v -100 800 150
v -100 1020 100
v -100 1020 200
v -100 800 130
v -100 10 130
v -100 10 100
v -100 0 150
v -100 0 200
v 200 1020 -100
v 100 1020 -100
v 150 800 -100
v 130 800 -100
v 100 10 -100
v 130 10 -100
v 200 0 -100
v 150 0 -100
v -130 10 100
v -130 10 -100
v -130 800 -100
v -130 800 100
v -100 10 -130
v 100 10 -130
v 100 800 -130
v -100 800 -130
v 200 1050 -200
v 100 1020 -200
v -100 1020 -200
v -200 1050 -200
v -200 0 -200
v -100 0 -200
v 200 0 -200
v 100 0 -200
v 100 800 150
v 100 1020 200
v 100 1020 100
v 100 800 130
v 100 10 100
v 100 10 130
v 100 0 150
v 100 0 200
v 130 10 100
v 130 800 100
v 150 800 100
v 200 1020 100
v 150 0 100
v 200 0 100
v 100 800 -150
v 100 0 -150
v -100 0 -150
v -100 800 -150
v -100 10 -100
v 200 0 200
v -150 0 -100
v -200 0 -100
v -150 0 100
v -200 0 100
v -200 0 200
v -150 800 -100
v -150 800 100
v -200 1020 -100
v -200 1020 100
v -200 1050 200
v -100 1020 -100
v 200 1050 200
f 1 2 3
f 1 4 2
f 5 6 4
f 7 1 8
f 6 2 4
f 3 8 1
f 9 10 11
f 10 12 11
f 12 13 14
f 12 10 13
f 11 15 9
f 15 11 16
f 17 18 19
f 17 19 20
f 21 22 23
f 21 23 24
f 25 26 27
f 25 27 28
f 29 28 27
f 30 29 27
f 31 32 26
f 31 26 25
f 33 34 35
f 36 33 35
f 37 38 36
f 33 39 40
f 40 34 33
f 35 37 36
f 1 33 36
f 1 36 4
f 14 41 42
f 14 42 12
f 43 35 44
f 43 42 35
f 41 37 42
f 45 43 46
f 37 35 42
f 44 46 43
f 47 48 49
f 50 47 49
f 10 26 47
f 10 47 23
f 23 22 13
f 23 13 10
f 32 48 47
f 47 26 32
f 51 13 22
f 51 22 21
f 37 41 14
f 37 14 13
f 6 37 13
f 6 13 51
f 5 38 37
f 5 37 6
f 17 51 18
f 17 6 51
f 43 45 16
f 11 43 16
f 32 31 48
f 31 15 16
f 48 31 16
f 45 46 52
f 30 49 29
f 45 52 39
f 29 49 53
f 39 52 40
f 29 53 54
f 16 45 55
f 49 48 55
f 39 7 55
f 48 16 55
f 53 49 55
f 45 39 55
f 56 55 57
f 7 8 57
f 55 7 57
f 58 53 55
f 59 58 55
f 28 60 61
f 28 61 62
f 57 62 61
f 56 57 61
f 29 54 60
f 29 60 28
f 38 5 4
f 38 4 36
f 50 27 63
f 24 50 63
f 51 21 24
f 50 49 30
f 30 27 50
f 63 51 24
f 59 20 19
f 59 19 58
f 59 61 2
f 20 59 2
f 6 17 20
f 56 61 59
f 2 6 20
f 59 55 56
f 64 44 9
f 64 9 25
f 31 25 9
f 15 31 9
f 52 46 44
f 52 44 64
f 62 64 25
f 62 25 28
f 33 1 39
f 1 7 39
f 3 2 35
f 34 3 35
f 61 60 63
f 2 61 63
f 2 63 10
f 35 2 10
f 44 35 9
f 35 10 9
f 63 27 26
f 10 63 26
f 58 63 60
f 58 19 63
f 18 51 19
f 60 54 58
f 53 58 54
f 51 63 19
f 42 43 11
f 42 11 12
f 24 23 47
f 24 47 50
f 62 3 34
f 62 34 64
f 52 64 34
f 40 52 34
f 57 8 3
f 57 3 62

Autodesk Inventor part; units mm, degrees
ref_plane "YZ Plane" through (0, 0, 0) normal (1, 0, 0) x (0, 1, 0)
ref_plane "XZ Plane" through (0, 0, 0) normal (0, 1, 0) x (-1, 0, 0)
ref_plane "XY Plane" through (0, 0, 0) normal (0, 0, 1) x (1, 0, 0)
sketch "Sketch1" plane through (0, 0, 0) normal (0, 1, 0) x (-1, 0, 0)
  line L0 (150, 150) -> (-150, 150)
  line L1 (-150, 150) -> (-150, -150)
  line L2 (-150, -150) -> (150, -150)
  line L3 (150, -150) -> (150, 150)
  line L4 (150, 150) -> (-150, -150) construction
  line L5 (-150, 150) -> (150, -150) construction
  line L6 (100, -100) -> (200, -100)
  line L7 (200, -100) -> (200, -200)
  line L8 (200, -200) -> (100, -200)
  line L9 (100, -200) -> (100, -100)
  line L10 (100, -100) -> (200, -200) construction
  line L11 (200, -100) -> (100, -200) construction
  line L12 (100, 200) -> (200, 200)
  line L13 (200, 200) -> (200, 100)
  line L14 (200, 100) -> (100, 100)
  line L15 (100, 100) -> (100, 200)
  line L16 (100, 200) -> (200, 100) construction
  line L17 (200, 200) -> (100, 100) construction
  line L18 (-100, 100) -> (-200, 100)
  line L19 (-200, 100) -> (-200, 200)
  line L20 (-200, 200) -> (-100, 200)
  line L21 (-100, 200) -> (-100, 100)
  line L22 (-100, 100) -> (-200, 200) construction
  line L23 (-200, 100) -> (-100, 200) construction
  line L24 (-100, -100) -> (-200, -100)
  line L25 (-200, -100) -> (-200, -200)
  line L26 (-200, -200) -> (-100, -200)
  line L27 (-100, -200) -> (-100, -100)
  line L28 (-100, -100) -> (-200, -200) construction
  line L29 (-200, -100) -> (-100, -200) construction
  line L30 (130, 130) -> (-130, 130)
  line L31 (-130, 130) -> (-130, -130)
  line L32 (-130, -130) -> (130, -130)
  line L33 (130, -130) -> (130, 130)
  line L34 (130, 130) -> (-130, -130) construction
  line L35 (-130, 130) -> (130, -130) construction
  point P0 (0, 0)
  dimension "d0" = 300
  dimension "d1" = 300
  dimension "d2" = 100
  dimension "d3" = 100
  dimension "d4" = 100
  dimension "d5" = 100
  dimension "d6" = 100
  dimension "d7" = 100
  dimension "d14" = 260
extrude "Extrusion1" add sketch "Sketch1" along normal blind 1050 contours L3 L14 L33 L30 L15 L0 | L0 L15 L12 L13 L14 L3 | L21 L30 L31 L18 L1 L0 | L0 L1 L18 L19 L20 L21 | L30 L33 L14 L15 | L6 L7 L8 L9 L2 L3 | L3 L2 L9 L32 L33 L6 | L21 L18 L31 L30 | L33 L32 L9 L6 | L24 L31 L32 L27 L2 L1 | L1 L2 L27 L26 L25 L24 | L24 L27 L32 L31
extrude "Extrusion2" add sketch "Sketch1" along normal blind 800 contours L3 L14 L33 L30 L15 L0 | L15 L30 L21 L0 | L3 L6 L33 L14 | L21 L30 L31 L18 L1 L0 | L3 L2 L9 L32 L33 L6 | L18 L31 L24 L1 | L2 L27 L32 L9 | L24 L31 L32 L27 L2 L1
sketch "Sketch2" plane through (0, 1050, 0) normal (0, 1, 0) x (1, 0, 0)
  line L0 (-200, -200) -> (-100, -200) projected
  line L1 (200, 100) -> (200, 200) projected
  line L2 (-200, -200) -> (200, -200)
  line L3 (200, -200) -> (200, 200)
  line L4 (200, 200) -> (-200, 200)
  line L5 (-200, 200) -> (-200, -200)
  point P0 (0, 0)
extrude "Extrusion3" add sketch "Sketch2" against normal blind 30
extrude "Extrusion4" add sketch "Sketch1" along normal blind 10 contours L3 L14 L33 L30 L15 L0 | L15 L30 L21 L0 | L3 L6 L33 L14 | L21 L30 L31 L18 L1 L0 | L30 L33 L14 L15 | L15 L14 L33 L6 L9 L32 L27 L24 L31 L18 L21 L30 | L3 L2 L9 L32 L33 L6 | L21 L18 L31 L30 | L33 L32 L9 L6 | L18 L31 L24 L1 | L2 L27 L32 L9 | L24 L31 L32 L27 L2 L1 | L24 L27 L32 L31
properties part number "smietnik2"
